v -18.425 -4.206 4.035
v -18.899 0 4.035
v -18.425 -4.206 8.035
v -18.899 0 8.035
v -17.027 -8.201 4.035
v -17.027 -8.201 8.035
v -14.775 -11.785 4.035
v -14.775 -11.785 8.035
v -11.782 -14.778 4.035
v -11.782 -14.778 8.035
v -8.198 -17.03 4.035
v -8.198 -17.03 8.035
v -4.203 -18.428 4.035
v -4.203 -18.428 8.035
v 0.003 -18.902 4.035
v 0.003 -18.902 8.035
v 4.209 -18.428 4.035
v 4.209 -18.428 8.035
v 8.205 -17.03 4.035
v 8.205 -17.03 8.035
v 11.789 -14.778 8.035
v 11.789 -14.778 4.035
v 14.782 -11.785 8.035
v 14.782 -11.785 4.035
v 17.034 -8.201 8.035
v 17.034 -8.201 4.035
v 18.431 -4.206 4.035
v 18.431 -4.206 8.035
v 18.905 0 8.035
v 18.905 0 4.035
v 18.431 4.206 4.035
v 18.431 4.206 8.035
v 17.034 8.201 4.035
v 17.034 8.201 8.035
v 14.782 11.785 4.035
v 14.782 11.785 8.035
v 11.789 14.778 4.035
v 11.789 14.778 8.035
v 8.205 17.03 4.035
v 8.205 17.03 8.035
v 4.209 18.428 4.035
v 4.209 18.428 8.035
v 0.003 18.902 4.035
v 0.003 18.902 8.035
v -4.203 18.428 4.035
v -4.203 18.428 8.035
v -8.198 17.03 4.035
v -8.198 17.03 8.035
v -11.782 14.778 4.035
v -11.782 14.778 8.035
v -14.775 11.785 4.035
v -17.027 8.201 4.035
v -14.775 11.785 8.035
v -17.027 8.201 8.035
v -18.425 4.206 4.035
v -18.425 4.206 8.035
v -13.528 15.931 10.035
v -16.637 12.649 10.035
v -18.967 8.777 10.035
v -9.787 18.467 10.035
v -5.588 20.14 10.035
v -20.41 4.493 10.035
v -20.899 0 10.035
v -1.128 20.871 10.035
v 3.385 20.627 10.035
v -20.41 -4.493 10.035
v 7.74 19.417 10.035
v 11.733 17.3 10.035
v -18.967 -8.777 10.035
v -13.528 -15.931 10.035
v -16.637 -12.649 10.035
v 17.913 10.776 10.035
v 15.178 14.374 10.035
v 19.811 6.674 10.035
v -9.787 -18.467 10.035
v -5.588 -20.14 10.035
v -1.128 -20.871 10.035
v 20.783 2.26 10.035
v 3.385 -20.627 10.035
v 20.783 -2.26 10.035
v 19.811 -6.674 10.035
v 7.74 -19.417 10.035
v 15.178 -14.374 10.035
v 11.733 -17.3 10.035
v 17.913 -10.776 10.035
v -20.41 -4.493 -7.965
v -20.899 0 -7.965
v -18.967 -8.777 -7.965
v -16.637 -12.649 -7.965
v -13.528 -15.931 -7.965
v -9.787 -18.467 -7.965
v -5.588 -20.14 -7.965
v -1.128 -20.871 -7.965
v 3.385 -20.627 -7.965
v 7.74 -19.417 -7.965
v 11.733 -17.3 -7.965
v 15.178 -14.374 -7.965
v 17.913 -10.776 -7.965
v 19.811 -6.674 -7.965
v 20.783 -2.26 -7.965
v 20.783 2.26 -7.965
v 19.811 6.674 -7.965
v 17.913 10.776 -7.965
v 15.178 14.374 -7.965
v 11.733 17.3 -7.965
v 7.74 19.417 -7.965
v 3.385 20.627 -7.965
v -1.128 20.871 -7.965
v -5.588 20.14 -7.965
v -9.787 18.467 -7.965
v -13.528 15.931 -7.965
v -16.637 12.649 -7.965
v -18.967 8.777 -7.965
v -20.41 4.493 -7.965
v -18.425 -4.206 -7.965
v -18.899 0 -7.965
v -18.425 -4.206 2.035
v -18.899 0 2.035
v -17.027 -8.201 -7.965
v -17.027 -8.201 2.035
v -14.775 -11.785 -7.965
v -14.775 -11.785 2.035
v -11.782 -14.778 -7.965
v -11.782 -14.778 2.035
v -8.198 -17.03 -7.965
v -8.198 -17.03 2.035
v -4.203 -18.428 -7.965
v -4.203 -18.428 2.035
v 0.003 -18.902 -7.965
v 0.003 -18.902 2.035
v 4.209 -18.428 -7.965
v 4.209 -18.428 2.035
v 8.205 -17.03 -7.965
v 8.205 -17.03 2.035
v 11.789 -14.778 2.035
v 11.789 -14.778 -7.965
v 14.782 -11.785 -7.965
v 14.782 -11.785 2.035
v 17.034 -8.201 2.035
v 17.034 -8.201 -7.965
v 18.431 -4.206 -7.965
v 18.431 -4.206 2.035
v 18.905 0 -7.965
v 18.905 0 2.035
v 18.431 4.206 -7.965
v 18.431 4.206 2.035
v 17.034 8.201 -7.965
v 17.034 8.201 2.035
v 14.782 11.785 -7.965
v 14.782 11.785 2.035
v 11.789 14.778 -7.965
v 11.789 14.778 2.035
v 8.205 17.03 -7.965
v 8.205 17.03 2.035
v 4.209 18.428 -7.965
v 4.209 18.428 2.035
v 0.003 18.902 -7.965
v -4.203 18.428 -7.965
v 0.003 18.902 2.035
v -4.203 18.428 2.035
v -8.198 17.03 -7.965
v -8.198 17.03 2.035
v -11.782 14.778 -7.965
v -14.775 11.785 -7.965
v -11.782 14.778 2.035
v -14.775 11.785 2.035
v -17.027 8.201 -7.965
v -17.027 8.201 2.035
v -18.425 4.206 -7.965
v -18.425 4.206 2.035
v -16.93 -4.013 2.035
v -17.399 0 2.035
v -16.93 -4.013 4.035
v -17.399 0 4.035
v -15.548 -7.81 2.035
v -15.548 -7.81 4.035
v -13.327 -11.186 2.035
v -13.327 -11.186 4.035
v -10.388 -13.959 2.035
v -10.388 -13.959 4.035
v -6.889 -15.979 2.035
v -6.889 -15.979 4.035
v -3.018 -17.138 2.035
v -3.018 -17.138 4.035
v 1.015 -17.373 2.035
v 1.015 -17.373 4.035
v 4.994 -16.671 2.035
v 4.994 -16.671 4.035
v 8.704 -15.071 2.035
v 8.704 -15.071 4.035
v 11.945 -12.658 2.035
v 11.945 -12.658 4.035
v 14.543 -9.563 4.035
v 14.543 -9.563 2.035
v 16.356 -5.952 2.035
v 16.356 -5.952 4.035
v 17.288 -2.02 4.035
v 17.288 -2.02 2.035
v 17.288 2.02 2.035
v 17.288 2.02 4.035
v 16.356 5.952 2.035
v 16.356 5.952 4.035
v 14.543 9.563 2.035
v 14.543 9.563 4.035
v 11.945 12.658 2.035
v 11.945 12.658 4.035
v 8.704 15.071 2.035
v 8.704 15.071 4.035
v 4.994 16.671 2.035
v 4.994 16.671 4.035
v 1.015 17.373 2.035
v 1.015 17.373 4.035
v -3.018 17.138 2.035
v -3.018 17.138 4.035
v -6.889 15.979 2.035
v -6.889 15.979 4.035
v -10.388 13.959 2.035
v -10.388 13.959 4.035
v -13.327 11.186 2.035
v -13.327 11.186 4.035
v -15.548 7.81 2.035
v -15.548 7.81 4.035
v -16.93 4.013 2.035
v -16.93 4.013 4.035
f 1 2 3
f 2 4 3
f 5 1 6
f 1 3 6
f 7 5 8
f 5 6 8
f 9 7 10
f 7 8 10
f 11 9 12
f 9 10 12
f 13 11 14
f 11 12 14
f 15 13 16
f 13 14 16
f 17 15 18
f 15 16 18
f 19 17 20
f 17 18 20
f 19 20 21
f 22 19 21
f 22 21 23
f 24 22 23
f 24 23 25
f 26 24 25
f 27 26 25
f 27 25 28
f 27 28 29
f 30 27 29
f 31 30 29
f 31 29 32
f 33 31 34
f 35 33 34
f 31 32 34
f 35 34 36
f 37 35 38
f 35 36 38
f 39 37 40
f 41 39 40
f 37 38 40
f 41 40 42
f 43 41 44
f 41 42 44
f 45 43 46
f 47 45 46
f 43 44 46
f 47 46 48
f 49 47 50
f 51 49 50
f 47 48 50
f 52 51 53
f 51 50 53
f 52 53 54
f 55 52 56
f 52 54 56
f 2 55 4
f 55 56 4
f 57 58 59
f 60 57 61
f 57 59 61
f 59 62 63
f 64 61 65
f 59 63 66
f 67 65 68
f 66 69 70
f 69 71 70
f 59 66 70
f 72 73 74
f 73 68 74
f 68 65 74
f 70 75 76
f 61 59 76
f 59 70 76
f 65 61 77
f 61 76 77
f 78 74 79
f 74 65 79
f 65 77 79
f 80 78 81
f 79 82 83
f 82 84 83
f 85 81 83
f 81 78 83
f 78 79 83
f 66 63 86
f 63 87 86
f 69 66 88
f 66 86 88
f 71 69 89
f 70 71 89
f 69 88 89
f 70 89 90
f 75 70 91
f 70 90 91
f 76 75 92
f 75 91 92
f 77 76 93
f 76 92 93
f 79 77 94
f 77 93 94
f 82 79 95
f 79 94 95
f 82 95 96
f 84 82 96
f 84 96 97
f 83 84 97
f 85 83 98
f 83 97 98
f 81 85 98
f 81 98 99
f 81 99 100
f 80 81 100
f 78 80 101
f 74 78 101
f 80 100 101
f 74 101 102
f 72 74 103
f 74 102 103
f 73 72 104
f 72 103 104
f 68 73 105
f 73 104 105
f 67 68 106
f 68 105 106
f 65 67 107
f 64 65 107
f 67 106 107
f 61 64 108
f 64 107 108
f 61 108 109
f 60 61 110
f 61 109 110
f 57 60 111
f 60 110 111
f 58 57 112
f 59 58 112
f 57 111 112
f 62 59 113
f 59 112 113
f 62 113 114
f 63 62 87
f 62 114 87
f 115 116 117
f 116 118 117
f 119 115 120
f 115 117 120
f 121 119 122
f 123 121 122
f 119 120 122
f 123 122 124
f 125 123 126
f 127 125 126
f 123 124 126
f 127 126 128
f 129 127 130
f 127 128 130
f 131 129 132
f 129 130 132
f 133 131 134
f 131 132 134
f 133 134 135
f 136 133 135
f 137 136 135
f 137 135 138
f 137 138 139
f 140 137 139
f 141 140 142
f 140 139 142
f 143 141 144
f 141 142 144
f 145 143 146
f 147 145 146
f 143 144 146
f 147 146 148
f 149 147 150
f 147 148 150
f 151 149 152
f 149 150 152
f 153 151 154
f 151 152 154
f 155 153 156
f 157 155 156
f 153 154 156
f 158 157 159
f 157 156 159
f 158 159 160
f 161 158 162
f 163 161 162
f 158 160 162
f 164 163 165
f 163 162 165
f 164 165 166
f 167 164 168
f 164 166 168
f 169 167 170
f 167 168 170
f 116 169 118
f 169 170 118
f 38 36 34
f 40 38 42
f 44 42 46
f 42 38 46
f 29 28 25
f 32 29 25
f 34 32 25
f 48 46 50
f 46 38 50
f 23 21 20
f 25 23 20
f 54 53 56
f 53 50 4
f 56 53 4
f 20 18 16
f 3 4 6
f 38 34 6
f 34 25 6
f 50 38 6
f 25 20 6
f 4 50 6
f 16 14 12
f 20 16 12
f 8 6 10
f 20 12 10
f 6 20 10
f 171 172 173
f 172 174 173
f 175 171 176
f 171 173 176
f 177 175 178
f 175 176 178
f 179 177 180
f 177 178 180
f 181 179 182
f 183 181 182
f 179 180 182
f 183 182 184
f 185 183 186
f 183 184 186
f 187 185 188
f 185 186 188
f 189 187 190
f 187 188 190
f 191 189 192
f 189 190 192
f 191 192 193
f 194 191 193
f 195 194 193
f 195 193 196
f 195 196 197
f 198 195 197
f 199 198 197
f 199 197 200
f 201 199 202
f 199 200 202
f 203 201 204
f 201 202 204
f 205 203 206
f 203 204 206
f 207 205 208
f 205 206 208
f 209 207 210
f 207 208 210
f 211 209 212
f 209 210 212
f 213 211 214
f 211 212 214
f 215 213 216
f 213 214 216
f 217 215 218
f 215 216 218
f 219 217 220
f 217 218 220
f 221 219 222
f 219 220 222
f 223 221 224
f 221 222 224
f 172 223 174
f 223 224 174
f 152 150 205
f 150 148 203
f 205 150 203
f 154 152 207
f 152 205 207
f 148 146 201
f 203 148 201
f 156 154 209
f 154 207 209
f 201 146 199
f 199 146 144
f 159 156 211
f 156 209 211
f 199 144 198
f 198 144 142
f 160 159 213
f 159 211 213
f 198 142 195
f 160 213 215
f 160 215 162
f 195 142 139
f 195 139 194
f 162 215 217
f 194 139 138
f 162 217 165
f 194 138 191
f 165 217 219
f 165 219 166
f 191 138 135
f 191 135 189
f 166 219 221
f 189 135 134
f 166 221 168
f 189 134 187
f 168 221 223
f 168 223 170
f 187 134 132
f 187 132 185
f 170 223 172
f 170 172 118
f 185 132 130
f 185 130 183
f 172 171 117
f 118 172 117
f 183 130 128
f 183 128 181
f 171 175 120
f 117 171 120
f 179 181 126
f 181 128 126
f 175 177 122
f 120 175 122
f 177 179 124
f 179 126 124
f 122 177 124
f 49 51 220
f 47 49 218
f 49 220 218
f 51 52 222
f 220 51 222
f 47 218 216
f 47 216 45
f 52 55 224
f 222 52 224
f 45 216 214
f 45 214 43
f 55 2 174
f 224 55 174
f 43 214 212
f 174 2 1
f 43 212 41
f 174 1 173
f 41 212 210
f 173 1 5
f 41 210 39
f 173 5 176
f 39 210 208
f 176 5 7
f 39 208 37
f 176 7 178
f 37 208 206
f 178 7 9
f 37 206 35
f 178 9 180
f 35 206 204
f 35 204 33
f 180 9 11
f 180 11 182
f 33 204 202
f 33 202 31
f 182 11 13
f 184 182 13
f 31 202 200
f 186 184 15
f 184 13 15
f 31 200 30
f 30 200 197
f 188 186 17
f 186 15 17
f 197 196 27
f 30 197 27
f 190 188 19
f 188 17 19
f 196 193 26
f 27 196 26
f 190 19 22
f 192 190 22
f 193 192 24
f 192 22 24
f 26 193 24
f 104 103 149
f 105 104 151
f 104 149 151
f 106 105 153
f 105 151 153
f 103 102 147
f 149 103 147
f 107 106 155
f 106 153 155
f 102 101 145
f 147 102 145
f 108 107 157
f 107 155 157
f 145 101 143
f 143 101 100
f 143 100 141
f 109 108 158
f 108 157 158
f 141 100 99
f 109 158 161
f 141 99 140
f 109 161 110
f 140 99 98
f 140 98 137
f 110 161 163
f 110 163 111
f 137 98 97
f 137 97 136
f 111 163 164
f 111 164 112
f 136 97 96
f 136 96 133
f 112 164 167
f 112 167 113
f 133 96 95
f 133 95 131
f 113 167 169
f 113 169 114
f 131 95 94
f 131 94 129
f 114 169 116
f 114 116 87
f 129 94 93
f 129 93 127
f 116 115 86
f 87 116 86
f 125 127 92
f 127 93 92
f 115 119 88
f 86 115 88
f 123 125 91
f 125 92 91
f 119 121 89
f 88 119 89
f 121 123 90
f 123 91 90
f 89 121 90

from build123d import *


with BuildPart() as part:
    # Skizze1 → Rotation2 (revolve)
    with BuildSketch(Plane(origin=(0, 0, 0), x_dir=(1, 0, 0), z_dir=(0, 1, 0)), mode=Mode.PRIVATE) as rotation2_sk:
        Polygon((0.00340061, -8.034840547), (0.00340061, -10.034840547), (20.90540061, -10.034840547), (20.90540061, 7.965159453), (18.90540061, 7.965159453), (18.90540061, -2.034840547), (17.40540061, -2.034840547), (17.40540061, -4.034840547), (18.90540061, -4.034840547), (18.90540061, -8.034840547), align=None)
    revolve(rotation2_sk.sketch.rotate(Axis((0.00340061, 0, 8.034840547), (0, 0, 1)), 180), axis=Axis((0.00340061, 0, 8.034840547), (0, 0, 1)))


solid = part.part
